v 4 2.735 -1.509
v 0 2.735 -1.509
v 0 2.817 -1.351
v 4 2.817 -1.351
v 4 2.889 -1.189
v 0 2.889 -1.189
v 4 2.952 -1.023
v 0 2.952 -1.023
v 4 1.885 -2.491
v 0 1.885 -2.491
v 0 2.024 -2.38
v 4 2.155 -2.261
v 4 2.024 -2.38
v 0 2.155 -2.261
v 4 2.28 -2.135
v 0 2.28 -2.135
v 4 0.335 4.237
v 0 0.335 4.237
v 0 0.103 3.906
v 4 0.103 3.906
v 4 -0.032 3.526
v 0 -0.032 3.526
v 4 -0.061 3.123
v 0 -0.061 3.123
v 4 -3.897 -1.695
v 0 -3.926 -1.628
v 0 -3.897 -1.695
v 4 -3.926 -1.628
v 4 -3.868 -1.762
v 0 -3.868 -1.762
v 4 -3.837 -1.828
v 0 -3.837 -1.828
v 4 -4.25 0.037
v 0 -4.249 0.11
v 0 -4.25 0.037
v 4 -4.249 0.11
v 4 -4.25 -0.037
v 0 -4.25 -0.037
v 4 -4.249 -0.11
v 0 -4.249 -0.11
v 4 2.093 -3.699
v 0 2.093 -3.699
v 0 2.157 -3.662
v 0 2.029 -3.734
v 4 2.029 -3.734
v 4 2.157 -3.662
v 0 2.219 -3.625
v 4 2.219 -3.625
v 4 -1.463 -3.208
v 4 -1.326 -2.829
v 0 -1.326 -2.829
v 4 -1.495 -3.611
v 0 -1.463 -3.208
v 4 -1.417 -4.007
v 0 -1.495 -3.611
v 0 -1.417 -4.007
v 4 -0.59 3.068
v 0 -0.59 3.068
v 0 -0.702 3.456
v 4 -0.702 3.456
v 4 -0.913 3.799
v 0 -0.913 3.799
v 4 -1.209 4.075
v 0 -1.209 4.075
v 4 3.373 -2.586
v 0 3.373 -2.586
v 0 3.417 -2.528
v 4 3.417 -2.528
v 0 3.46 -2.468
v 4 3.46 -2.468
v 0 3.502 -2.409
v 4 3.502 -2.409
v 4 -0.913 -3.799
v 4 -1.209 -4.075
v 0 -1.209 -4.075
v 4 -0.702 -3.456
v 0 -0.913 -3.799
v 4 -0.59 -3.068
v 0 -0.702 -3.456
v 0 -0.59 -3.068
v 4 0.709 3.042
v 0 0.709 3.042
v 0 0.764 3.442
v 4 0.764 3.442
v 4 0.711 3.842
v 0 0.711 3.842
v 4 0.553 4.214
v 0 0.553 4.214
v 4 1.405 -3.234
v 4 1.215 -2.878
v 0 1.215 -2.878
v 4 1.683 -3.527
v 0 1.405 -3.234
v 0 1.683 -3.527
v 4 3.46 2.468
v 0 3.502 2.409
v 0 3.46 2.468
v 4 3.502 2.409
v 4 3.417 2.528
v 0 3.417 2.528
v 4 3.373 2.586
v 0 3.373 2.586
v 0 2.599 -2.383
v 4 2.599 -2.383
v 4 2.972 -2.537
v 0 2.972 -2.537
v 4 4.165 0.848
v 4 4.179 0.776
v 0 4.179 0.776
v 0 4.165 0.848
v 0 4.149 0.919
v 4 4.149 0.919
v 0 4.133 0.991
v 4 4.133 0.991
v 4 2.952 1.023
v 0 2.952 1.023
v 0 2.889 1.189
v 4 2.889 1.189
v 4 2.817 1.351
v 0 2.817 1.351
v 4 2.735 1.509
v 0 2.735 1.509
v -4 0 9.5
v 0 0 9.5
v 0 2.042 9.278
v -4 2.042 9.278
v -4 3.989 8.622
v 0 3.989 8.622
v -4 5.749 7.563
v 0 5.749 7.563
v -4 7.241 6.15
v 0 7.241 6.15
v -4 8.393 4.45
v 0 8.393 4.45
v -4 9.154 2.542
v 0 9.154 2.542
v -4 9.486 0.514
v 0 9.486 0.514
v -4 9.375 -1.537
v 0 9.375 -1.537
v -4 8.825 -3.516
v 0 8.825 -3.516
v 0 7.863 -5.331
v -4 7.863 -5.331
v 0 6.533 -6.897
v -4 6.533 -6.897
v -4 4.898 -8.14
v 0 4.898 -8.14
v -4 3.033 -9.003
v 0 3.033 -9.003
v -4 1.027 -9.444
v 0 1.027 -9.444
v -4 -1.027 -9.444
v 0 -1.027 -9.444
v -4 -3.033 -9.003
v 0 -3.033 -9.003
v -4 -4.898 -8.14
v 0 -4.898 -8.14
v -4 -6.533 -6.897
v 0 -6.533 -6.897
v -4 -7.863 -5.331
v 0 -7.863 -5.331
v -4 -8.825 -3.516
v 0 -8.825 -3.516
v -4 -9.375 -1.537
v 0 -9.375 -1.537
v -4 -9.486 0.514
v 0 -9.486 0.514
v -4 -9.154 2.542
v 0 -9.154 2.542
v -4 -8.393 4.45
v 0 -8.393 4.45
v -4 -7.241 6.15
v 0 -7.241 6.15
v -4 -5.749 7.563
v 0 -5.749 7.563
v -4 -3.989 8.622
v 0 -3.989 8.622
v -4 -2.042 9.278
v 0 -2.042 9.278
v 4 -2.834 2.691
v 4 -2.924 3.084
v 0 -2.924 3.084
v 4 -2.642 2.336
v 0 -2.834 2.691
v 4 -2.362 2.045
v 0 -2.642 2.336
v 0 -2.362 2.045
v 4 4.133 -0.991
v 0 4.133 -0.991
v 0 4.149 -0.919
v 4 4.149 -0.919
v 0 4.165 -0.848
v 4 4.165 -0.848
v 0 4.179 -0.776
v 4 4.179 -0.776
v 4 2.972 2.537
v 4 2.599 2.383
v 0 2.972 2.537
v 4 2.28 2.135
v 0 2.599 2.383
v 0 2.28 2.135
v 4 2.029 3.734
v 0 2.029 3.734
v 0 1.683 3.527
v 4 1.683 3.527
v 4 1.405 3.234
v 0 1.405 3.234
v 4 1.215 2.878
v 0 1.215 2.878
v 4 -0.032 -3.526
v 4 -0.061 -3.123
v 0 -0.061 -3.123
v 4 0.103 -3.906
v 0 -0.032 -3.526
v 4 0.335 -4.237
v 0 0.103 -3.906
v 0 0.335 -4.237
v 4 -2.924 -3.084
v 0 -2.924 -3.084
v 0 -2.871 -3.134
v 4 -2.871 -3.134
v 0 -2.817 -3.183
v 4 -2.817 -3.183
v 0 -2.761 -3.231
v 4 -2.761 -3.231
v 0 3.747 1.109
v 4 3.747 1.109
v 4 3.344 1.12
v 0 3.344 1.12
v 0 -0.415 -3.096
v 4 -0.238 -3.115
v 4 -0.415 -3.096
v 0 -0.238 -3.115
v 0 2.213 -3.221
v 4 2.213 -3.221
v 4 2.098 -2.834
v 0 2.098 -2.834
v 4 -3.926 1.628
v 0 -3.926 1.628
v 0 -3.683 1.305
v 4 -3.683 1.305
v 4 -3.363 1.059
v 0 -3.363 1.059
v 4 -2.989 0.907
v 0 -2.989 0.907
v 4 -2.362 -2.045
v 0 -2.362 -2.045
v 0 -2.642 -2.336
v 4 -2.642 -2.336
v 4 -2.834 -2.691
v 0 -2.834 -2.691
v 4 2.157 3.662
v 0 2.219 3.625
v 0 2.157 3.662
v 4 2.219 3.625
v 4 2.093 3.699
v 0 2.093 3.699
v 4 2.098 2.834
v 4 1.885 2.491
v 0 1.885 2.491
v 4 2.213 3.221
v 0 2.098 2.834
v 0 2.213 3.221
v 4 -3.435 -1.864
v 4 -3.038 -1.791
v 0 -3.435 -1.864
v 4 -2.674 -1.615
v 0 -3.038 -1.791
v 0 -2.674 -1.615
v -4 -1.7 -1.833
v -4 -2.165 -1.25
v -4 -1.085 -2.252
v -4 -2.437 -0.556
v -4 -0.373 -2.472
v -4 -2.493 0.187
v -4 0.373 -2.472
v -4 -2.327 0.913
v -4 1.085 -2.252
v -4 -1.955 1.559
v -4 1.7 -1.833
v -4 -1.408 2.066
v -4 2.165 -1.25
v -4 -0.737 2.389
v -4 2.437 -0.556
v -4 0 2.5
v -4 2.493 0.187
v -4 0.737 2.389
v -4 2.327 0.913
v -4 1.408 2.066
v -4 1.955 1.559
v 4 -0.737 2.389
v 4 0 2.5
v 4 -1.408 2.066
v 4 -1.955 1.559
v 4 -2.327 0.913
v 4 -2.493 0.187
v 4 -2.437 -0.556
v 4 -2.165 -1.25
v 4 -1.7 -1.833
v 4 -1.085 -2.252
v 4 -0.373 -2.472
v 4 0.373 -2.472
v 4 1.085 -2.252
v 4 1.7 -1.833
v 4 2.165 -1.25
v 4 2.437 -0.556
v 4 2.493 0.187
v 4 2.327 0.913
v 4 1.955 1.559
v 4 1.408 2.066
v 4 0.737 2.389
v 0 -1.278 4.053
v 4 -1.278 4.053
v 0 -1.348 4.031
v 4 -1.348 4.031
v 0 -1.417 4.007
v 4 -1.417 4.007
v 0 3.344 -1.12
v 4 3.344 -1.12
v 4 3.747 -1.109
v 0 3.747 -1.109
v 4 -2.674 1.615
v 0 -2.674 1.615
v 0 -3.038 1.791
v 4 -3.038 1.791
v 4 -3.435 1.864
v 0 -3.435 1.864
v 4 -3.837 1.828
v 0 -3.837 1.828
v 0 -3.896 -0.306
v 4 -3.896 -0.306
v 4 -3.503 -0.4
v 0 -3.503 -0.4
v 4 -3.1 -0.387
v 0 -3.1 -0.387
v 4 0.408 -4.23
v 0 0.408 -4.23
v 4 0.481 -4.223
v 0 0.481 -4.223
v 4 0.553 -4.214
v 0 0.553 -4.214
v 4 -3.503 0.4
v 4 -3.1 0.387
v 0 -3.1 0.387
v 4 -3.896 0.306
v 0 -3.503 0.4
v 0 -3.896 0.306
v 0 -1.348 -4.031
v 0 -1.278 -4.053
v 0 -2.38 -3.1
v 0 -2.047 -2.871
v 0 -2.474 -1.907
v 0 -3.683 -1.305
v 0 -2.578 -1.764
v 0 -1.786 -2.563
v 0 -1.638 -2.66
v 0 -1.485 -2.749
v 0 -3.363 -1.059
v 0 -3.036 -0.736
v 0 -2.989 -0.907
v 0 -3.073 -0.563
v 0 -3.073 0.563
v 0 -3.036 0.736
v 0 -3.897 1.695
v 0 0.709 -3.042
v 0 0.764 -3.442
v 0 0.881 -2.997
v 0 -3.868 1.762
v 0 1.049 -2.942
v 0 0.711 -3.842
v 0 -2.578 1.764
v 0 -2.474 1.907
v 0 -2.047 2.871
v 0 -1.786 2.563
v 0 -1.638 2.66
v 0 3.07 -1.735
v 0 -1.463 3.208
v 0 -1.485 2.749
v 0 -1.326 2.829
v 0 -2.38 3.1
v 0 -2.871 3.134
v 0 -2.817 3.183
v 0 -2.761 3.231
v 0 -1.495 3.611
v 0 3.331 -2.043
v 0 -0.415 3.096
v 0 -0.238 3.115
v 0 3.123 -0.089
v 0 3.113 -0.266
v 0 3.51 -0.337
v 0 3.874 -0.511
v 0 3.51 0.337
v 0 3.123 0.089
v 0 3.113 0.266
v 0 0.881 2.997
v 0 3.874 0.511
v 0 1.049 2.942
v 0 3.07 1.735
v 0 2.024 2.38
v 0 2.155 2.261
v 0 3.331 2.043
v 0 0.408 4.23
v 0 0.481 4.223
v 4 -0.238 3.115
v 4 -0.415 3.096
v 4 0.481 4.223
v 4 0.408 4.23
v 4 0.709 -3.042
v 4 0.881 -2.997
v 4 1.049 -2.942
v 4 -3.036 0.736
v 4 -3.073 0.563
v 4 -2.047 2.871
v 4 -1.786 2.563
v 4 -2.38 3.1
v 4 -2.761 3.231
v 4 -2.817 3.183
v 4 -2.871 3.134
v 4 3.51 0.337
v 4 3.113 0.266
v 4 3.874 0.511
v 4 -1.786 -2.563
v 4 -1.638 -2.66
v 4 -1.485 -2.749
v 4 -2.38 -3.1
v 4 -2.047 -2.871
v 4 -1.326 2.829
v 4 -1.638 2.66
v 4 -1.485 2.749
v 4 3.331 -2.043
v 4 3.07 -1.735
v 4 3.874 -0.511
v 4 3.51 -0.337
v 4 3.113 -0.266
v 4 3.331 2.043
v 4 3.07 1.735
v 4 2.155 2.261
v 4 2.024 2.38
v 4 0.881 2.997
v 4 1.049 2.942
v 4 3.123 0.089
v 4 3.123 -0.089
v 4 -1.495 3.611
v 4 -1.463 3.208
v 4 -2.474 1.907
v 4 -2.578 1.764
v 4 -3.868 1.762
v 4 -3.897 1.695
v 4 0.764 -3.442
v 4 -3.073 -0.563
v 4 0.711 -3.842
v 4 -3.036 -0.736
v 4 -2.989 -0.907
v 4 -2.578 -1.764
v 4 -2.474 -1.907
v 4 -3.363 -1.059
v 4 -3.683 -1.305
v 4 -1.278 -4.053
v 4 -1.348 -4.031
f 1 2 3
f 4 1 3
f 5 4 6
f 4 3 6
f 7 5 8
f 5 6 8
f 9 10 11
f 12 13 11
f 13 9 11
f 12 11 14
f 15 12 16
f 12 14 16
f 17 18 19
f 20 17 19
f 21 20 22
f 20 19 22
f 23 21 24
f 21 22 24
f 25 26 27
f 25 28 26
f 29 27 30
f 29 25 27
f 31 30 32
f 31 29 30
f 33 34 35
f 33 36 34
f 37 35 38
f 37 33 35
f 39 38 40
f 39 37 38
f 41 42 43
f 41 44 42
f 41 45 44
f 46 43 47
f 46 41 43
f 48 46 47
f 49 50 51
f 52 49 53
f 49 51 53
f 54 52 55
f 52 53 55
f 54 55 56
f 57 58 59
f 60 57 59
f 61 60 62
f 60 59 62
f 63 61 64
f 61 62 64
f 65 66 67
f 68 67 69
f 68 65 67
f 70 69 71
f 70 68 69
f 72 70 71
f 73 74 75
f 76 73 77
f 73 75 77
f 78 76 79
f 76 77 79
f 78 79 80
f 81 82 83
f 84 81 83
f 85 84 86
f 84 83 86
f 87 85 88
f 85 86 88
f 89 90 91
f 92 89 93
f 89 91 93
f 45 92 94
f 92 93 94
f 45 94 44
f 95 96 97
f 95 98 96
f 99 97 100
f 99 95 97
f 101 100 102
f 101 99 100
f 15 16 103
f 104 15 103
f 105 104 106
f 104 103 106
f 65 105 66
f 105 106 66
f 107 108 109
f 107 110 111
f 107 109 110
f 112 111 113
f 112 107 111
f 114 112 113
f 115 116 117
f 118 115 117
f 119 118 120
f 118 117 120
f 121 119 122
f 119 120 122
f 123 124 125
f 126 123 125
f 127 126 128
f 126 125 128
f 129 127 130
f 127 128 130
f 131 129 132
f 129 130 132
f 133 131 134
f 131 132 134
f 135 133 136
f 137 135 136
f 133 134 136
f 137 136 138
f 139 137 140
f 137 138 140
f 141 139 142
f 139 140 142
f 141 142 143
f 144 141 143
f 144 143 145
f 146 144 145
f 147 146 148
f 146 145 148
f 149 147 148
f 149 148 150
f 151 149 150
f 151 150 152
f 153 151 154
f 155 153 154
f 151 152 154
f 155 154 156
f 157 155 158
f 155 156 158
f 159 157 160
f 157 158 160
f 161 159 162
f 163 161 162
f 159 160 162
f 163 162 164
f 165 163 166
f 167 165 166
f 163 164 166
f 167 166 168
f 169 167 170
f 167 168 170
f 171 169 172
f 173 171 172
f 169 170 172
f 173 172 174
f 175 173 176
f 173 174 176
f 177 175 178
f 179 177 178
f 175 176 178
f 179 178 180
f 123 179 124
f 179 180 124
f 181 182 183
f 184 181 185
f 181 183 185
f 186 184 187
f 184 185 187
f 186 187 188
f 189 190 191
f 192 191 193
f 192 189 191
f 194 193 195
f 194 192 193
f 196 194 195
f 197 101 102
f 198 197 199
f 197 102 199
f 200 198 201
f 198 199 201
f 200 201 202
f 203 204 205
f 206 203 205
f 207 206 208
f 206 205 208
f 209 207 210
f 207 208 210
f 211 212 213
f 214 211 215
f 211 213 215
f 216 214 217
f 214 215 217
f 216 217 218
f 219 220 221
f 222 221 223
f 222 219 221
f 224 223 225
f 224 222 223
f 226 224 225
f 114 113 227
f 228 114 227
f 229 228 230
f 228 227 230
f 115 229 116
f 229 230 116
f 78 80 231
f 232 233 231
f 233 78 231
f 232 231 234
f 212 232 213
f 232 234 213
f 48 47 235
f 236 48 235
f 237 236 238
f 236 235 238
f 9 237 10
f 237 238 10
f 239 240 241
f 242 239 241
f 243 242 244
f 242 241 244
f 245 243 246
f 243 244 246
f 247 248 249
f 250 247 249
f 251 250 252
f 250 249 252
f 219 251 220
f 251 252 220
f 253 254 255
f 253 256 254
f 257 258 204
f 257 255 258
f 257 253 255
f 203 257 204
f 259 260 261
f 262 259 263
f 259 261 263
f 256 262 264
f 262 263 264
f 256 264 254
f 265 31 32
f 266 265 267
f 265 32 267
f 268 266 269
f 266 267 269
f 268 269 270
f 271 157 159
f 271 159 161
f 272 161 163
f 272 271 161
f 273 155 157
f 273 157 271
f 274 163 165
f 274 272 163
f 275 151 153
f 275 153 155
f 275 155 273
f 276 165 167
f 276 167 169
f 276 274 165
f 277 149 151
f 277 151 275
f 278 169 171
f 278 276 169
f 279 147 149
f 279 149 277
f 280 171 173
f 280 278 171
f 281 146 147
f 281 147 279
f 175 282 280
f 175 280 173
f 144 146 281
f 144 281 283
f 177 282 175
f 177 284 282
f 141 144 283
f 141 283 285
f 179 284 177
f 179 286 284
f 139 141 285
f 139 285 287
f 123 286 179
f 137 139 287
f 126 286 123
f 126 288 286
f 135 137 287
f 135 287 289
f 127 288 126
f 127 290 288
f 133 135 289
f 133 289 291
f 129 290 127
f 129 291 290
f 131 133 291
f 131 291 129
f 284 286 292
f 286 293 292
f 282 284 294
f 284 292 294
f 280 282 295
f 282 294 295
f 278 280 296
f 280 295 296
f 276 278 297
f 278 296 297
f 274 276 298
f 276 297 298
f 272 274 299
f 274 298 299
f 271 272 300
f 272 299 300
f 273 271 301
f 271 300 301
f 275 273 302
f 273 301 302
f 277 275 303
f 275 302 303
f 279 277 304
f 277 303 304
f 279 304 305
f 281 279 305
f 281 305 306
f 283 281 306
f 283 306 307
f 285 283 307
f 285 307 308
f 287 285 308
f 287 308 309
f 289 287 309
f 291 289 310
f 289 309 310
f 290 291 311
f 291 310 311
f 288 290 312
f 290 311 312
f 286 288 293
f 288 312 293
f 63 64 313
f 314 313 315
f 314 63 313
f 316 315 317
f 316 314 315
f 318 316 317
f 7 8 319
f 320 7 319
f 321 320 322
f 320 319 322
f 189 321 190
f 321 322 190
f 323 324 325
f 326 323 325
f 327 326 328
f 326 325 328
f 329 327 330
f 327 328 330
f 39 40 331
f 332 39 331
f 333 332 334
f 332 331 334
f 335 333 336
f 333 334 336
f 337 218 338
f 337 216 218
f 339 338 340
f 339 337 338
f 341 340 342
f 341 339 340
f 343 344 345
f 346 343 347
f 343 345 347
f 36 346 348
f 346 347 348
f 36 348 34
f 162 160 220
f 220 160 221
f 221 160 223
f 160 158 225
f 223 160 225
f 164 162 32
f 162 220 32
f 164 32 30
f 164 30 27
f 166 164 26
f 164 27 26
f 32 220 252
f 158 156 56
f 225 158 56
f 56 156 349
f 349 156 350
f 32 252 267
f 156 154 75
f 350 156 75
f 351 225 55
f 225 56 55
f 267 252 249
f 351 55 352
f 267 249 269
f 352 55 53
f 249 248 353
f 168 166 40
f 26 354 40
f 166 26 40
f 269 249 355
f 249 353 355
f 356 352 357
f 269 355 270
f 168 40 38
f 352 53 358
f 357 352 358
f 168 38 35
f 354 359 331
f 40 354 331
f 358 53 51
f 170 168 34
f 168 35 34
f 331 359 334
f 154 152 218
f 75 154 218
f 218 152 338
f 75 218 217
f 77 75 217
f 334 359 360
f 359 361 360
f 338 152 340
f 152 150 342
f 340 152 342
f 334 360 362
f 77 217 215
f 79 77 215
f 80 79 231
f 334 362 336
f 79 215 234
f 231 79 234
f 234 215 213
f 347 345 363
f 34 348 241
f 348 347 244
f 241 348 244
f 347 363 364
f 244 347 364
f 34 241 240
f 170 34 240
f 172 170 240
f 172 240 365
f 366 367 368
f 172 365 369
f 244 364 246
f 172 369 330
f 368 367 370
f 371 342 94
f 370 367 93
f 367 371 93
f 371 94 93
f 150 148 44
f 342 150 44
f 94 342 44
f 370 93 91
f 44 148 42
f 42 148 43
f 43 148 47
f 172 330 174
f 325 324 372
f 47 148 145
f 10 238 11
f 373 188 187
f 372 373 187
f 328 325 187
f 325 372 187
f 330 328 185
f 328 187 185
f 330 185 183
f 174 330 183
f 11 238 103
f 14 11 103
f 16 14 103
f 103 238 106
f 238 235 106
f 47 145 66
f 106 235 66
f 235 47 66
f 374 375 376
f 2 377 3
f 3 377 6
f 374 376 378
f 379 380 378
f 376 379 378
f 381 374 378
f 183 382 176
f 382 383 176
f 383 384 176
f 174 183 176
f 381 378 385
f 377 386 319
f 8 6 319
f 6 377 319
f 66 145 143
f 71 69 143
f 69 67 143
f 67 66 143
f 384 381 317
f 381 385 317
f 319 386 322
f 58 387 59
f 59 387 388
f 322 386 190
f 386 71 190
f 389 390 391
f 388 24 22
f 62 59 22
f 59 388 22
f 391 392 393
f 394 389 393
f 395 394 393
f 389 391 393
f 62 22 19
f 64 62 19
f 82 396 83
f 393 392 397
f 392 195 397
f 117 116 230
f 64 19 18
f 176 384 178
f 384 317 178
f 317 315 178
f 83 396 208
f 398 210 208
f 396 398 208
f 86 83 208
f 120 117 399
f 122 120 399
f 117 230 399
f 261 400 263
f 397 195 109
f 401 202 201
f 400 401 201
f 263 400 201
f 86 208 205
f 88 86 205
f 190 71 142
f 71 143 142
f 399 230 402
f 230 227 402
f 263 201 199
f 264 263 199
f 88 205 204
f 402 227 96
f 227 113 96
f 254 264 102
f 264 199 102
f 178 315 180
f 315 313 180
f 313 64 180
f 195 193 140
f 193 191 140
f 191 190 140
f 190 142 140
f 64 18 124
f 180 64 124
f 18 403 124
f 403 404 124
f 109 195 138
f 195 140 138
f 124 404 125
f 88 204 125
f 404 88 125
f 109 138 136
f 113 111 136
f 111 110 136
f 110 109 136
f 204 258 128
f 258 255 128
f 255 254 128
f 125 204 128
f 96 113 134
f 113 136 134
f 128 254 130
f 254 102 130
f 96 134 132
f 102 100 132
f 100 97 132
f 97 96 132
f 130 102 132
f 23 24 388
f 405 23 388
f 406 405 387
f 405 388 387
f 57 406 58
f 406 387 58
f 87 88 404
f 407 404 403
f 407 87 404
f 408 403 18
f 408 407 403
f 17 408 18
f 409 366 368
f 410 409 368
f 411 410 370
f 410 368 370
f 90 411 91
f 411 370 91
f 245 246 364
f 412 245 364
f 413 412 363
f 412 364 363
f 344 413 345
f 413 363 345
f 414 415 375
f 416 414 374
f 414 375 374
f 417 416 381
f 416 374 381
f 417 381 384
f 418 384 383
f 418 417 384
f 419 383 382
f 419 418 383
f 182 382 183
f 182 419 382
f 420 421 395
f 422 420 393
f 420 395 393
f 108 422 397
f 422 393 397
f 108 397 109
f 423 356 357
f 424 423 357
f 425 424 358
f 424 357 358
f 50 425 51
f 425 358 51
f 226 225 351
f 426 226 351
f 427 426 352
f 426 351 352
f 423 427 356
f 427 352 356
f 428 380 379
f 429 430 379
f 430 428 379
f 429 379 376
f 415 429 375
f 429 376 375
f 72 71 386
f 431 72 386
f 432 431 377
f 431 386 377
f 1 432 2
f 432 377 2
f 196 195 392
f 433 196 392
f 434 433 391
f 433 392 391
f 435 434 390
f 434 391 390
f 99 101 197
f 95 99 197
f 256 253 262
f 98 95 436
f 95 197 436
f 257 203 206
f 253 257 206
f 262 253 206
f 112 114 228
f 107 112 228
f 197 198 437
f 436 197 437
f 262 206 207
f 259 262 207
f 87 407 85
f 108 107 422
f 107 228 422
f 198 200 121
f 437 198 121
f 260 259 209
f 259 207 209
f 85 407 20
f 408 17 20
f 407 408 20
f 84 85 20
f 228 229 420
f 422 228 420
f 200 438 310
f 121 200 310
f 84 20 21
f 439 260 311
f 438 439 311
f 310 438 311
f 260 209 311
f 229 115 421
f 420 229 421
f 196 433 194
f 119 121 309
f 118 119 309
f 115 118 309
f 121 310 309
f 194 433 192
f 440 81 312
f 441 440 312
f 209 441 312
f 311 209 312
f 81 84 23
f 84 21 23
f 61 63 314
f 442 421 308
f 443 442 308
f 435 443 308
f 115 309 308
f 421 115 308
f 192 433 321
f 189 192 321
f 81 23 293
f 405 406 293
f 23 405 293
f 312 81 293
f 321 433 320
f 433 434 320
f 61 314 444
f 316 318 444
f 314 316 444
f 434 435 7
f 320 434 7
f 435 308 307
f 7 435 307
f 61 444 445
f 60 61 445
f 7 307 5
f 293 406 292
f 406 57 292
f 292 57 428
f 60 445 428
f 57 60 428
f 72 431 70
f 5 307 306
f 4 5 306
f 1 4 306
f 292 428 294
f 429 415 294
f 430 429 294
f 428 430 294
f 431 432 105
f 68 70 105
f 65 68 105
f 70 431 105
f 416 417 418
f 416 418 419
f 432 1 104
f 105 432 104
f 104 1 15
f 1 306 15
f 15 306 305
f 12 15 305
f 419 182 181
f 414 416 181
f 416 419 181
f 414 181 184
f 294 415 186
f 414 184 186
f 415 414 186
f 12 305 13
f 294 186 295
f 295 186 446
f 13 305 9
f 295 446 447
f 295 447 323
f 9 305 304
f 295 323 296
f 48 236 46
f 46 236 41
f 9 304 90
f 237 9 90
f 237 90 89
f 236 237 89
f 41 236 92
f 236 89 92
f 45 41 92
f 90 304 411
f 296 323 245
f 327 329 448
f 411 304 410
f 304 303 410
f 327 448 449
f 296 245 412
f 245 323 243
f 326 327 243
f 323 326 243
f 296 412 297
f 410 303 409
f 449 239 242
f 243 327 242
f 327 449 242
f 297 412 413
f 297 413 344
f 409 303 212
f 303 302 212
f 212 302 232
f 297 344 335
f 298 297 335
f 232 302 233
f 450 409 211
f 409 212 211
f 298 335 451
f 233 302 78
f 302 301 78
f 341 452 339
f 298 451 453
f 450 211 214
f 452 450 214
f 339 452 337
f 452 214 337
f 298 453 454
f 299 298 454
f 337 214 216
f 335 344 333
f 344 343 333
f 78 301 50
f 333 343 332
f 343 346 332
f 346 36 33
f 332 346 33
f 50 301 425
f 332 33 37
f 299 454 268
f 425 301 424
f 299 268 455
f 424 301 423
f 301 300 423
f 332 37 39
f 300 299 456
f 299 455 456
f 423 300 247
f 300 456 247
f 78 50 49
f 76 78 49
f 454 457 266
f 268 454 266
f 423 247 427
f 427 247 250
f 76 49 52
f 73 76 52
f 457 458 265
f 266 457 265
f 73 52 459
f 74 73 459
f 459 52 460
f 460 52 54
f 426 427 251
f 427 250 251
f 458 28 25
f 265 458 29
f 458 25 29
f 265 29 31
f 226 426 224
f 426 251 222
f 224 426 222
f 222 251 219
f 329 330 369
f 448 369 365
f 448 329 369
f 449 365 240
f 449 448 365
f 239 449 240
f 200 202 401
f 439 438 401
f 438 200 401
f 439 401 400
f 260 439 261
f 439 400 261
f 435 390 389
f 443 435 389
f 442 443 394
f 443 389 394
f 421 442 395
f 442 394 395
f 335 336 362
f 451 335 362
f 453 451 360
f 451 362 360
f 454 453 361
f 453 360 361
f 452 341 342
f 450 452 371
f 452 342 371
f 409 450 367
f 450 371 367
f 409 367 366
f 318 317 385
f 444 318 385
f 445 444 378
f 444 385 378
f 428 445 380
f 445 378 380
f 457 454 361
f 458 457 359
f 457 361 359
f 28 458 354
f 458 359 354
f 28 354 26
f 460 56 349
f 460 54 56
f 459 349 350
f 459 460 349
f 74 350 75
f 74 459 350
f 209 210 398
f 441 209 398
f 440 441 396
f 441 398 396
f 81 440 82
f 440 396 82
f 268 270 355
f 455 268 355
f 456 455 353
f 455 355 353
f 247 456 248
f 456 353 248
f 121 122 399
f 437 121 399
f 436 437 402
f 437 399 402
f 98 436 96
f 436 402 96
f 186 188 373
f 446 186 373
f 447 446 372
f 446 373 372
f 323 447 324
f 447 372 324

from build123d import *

# Parameters (mm, degrees)
BASPROSKE_W      = 4
BASPROSKE_H      = 4.25
TOOTHCUT_DEPTH   = 8.219764539
TEETHCUTS_COUNT  = 15
TEETHCUTS_ANGLE  = 336
HUBNEAONESKE_R   = 9.5
HUBNEARONE_DEPTH = 4.0001016
BORSKE_R         = 2.5
BORE_DEPTH       = 8.0001016


with BuildPart() as part:
    # BasProSke → Base-Revolve (revolve)
    with BuildSketch(Plane(origin=(0, 0, 0), x_dir=(1, 0, 0), z_dir=(0, 1, 0)), mode=Mode.PRIVATE) as base_revolve_sk:
        with Locations((2, 2.125)):
            Rectangle(BASPROSKE_W, BASPROSKE_H)
    revolve(base_revolve_sk.sketch.rotate(Axis((-10, 0, 0), (1, 0, 0)), 180), axis=Axis((-10, 0, 0), (1, 0, 0)))

    # TooCutSke → ToothCut (cut, through all)
    with BuildSketch(Plane(origin=(0, 0, 0), x_dir=(0, 0, -1), z_dir=(1, 0, 0))):
        with BuildLine():
            ThreePointArc((0.265767165, 3.112674704), (0, 3.124), (-0.265767165, 3.112674704))
            ThreePointArc((-0.265767165, 3.112674704), (-0.418628877, 3.712626775), (-0.800767345, 4.19974009))
            ThreePointArc((-0.800767345, 4.19974009), (0, 4.2754), (0.800767345, 4.19974009))
            ThreePointArc((0.800767345, 4.19974009), (0.418628877, 3.712626775), (0.265767165, 3.112674704))
        make_face()
    toothcut = extrude(amount=TOOTHCUT_DEPTH, mode=Mode.SUBTRACT)

    # TeethCuts: ToothCut ×15 about axis
    teethcuts_axis = Axis((-10, 0, 0), (1, 0, 0))
    for i in range(1, TEETHCUTS_COUNT):
        add(toothcut.rotate(teethcuts_axis, i * TEETHCUTS_ANGLE / (TEETHCUTS_COUNT - 1)), mode=Mode.SUBTRACT)

    # HubNeaOneSke → HubNearOne (add)
    with BuildSketch(Plane.ZY):
        Circle(HUBNEAONESKE_R)
    extrude(amount=HUBNEARONE_DEPTH)

    # BorSke → Bore (cut, symmetric)
    with BuildSketch(Plane(origin=(0, 0, 0), x_dir=(0, 0, -1), z_dir=(1, 0, 0))):
        with Locations(Location((0, 0, 0), (0, 0, 180))):
            Circle(BORSKE_R)
    extrude(amount=BORE_DEPTH, both=True, mode=Mode.SUBTRACT)


solid = part.part
